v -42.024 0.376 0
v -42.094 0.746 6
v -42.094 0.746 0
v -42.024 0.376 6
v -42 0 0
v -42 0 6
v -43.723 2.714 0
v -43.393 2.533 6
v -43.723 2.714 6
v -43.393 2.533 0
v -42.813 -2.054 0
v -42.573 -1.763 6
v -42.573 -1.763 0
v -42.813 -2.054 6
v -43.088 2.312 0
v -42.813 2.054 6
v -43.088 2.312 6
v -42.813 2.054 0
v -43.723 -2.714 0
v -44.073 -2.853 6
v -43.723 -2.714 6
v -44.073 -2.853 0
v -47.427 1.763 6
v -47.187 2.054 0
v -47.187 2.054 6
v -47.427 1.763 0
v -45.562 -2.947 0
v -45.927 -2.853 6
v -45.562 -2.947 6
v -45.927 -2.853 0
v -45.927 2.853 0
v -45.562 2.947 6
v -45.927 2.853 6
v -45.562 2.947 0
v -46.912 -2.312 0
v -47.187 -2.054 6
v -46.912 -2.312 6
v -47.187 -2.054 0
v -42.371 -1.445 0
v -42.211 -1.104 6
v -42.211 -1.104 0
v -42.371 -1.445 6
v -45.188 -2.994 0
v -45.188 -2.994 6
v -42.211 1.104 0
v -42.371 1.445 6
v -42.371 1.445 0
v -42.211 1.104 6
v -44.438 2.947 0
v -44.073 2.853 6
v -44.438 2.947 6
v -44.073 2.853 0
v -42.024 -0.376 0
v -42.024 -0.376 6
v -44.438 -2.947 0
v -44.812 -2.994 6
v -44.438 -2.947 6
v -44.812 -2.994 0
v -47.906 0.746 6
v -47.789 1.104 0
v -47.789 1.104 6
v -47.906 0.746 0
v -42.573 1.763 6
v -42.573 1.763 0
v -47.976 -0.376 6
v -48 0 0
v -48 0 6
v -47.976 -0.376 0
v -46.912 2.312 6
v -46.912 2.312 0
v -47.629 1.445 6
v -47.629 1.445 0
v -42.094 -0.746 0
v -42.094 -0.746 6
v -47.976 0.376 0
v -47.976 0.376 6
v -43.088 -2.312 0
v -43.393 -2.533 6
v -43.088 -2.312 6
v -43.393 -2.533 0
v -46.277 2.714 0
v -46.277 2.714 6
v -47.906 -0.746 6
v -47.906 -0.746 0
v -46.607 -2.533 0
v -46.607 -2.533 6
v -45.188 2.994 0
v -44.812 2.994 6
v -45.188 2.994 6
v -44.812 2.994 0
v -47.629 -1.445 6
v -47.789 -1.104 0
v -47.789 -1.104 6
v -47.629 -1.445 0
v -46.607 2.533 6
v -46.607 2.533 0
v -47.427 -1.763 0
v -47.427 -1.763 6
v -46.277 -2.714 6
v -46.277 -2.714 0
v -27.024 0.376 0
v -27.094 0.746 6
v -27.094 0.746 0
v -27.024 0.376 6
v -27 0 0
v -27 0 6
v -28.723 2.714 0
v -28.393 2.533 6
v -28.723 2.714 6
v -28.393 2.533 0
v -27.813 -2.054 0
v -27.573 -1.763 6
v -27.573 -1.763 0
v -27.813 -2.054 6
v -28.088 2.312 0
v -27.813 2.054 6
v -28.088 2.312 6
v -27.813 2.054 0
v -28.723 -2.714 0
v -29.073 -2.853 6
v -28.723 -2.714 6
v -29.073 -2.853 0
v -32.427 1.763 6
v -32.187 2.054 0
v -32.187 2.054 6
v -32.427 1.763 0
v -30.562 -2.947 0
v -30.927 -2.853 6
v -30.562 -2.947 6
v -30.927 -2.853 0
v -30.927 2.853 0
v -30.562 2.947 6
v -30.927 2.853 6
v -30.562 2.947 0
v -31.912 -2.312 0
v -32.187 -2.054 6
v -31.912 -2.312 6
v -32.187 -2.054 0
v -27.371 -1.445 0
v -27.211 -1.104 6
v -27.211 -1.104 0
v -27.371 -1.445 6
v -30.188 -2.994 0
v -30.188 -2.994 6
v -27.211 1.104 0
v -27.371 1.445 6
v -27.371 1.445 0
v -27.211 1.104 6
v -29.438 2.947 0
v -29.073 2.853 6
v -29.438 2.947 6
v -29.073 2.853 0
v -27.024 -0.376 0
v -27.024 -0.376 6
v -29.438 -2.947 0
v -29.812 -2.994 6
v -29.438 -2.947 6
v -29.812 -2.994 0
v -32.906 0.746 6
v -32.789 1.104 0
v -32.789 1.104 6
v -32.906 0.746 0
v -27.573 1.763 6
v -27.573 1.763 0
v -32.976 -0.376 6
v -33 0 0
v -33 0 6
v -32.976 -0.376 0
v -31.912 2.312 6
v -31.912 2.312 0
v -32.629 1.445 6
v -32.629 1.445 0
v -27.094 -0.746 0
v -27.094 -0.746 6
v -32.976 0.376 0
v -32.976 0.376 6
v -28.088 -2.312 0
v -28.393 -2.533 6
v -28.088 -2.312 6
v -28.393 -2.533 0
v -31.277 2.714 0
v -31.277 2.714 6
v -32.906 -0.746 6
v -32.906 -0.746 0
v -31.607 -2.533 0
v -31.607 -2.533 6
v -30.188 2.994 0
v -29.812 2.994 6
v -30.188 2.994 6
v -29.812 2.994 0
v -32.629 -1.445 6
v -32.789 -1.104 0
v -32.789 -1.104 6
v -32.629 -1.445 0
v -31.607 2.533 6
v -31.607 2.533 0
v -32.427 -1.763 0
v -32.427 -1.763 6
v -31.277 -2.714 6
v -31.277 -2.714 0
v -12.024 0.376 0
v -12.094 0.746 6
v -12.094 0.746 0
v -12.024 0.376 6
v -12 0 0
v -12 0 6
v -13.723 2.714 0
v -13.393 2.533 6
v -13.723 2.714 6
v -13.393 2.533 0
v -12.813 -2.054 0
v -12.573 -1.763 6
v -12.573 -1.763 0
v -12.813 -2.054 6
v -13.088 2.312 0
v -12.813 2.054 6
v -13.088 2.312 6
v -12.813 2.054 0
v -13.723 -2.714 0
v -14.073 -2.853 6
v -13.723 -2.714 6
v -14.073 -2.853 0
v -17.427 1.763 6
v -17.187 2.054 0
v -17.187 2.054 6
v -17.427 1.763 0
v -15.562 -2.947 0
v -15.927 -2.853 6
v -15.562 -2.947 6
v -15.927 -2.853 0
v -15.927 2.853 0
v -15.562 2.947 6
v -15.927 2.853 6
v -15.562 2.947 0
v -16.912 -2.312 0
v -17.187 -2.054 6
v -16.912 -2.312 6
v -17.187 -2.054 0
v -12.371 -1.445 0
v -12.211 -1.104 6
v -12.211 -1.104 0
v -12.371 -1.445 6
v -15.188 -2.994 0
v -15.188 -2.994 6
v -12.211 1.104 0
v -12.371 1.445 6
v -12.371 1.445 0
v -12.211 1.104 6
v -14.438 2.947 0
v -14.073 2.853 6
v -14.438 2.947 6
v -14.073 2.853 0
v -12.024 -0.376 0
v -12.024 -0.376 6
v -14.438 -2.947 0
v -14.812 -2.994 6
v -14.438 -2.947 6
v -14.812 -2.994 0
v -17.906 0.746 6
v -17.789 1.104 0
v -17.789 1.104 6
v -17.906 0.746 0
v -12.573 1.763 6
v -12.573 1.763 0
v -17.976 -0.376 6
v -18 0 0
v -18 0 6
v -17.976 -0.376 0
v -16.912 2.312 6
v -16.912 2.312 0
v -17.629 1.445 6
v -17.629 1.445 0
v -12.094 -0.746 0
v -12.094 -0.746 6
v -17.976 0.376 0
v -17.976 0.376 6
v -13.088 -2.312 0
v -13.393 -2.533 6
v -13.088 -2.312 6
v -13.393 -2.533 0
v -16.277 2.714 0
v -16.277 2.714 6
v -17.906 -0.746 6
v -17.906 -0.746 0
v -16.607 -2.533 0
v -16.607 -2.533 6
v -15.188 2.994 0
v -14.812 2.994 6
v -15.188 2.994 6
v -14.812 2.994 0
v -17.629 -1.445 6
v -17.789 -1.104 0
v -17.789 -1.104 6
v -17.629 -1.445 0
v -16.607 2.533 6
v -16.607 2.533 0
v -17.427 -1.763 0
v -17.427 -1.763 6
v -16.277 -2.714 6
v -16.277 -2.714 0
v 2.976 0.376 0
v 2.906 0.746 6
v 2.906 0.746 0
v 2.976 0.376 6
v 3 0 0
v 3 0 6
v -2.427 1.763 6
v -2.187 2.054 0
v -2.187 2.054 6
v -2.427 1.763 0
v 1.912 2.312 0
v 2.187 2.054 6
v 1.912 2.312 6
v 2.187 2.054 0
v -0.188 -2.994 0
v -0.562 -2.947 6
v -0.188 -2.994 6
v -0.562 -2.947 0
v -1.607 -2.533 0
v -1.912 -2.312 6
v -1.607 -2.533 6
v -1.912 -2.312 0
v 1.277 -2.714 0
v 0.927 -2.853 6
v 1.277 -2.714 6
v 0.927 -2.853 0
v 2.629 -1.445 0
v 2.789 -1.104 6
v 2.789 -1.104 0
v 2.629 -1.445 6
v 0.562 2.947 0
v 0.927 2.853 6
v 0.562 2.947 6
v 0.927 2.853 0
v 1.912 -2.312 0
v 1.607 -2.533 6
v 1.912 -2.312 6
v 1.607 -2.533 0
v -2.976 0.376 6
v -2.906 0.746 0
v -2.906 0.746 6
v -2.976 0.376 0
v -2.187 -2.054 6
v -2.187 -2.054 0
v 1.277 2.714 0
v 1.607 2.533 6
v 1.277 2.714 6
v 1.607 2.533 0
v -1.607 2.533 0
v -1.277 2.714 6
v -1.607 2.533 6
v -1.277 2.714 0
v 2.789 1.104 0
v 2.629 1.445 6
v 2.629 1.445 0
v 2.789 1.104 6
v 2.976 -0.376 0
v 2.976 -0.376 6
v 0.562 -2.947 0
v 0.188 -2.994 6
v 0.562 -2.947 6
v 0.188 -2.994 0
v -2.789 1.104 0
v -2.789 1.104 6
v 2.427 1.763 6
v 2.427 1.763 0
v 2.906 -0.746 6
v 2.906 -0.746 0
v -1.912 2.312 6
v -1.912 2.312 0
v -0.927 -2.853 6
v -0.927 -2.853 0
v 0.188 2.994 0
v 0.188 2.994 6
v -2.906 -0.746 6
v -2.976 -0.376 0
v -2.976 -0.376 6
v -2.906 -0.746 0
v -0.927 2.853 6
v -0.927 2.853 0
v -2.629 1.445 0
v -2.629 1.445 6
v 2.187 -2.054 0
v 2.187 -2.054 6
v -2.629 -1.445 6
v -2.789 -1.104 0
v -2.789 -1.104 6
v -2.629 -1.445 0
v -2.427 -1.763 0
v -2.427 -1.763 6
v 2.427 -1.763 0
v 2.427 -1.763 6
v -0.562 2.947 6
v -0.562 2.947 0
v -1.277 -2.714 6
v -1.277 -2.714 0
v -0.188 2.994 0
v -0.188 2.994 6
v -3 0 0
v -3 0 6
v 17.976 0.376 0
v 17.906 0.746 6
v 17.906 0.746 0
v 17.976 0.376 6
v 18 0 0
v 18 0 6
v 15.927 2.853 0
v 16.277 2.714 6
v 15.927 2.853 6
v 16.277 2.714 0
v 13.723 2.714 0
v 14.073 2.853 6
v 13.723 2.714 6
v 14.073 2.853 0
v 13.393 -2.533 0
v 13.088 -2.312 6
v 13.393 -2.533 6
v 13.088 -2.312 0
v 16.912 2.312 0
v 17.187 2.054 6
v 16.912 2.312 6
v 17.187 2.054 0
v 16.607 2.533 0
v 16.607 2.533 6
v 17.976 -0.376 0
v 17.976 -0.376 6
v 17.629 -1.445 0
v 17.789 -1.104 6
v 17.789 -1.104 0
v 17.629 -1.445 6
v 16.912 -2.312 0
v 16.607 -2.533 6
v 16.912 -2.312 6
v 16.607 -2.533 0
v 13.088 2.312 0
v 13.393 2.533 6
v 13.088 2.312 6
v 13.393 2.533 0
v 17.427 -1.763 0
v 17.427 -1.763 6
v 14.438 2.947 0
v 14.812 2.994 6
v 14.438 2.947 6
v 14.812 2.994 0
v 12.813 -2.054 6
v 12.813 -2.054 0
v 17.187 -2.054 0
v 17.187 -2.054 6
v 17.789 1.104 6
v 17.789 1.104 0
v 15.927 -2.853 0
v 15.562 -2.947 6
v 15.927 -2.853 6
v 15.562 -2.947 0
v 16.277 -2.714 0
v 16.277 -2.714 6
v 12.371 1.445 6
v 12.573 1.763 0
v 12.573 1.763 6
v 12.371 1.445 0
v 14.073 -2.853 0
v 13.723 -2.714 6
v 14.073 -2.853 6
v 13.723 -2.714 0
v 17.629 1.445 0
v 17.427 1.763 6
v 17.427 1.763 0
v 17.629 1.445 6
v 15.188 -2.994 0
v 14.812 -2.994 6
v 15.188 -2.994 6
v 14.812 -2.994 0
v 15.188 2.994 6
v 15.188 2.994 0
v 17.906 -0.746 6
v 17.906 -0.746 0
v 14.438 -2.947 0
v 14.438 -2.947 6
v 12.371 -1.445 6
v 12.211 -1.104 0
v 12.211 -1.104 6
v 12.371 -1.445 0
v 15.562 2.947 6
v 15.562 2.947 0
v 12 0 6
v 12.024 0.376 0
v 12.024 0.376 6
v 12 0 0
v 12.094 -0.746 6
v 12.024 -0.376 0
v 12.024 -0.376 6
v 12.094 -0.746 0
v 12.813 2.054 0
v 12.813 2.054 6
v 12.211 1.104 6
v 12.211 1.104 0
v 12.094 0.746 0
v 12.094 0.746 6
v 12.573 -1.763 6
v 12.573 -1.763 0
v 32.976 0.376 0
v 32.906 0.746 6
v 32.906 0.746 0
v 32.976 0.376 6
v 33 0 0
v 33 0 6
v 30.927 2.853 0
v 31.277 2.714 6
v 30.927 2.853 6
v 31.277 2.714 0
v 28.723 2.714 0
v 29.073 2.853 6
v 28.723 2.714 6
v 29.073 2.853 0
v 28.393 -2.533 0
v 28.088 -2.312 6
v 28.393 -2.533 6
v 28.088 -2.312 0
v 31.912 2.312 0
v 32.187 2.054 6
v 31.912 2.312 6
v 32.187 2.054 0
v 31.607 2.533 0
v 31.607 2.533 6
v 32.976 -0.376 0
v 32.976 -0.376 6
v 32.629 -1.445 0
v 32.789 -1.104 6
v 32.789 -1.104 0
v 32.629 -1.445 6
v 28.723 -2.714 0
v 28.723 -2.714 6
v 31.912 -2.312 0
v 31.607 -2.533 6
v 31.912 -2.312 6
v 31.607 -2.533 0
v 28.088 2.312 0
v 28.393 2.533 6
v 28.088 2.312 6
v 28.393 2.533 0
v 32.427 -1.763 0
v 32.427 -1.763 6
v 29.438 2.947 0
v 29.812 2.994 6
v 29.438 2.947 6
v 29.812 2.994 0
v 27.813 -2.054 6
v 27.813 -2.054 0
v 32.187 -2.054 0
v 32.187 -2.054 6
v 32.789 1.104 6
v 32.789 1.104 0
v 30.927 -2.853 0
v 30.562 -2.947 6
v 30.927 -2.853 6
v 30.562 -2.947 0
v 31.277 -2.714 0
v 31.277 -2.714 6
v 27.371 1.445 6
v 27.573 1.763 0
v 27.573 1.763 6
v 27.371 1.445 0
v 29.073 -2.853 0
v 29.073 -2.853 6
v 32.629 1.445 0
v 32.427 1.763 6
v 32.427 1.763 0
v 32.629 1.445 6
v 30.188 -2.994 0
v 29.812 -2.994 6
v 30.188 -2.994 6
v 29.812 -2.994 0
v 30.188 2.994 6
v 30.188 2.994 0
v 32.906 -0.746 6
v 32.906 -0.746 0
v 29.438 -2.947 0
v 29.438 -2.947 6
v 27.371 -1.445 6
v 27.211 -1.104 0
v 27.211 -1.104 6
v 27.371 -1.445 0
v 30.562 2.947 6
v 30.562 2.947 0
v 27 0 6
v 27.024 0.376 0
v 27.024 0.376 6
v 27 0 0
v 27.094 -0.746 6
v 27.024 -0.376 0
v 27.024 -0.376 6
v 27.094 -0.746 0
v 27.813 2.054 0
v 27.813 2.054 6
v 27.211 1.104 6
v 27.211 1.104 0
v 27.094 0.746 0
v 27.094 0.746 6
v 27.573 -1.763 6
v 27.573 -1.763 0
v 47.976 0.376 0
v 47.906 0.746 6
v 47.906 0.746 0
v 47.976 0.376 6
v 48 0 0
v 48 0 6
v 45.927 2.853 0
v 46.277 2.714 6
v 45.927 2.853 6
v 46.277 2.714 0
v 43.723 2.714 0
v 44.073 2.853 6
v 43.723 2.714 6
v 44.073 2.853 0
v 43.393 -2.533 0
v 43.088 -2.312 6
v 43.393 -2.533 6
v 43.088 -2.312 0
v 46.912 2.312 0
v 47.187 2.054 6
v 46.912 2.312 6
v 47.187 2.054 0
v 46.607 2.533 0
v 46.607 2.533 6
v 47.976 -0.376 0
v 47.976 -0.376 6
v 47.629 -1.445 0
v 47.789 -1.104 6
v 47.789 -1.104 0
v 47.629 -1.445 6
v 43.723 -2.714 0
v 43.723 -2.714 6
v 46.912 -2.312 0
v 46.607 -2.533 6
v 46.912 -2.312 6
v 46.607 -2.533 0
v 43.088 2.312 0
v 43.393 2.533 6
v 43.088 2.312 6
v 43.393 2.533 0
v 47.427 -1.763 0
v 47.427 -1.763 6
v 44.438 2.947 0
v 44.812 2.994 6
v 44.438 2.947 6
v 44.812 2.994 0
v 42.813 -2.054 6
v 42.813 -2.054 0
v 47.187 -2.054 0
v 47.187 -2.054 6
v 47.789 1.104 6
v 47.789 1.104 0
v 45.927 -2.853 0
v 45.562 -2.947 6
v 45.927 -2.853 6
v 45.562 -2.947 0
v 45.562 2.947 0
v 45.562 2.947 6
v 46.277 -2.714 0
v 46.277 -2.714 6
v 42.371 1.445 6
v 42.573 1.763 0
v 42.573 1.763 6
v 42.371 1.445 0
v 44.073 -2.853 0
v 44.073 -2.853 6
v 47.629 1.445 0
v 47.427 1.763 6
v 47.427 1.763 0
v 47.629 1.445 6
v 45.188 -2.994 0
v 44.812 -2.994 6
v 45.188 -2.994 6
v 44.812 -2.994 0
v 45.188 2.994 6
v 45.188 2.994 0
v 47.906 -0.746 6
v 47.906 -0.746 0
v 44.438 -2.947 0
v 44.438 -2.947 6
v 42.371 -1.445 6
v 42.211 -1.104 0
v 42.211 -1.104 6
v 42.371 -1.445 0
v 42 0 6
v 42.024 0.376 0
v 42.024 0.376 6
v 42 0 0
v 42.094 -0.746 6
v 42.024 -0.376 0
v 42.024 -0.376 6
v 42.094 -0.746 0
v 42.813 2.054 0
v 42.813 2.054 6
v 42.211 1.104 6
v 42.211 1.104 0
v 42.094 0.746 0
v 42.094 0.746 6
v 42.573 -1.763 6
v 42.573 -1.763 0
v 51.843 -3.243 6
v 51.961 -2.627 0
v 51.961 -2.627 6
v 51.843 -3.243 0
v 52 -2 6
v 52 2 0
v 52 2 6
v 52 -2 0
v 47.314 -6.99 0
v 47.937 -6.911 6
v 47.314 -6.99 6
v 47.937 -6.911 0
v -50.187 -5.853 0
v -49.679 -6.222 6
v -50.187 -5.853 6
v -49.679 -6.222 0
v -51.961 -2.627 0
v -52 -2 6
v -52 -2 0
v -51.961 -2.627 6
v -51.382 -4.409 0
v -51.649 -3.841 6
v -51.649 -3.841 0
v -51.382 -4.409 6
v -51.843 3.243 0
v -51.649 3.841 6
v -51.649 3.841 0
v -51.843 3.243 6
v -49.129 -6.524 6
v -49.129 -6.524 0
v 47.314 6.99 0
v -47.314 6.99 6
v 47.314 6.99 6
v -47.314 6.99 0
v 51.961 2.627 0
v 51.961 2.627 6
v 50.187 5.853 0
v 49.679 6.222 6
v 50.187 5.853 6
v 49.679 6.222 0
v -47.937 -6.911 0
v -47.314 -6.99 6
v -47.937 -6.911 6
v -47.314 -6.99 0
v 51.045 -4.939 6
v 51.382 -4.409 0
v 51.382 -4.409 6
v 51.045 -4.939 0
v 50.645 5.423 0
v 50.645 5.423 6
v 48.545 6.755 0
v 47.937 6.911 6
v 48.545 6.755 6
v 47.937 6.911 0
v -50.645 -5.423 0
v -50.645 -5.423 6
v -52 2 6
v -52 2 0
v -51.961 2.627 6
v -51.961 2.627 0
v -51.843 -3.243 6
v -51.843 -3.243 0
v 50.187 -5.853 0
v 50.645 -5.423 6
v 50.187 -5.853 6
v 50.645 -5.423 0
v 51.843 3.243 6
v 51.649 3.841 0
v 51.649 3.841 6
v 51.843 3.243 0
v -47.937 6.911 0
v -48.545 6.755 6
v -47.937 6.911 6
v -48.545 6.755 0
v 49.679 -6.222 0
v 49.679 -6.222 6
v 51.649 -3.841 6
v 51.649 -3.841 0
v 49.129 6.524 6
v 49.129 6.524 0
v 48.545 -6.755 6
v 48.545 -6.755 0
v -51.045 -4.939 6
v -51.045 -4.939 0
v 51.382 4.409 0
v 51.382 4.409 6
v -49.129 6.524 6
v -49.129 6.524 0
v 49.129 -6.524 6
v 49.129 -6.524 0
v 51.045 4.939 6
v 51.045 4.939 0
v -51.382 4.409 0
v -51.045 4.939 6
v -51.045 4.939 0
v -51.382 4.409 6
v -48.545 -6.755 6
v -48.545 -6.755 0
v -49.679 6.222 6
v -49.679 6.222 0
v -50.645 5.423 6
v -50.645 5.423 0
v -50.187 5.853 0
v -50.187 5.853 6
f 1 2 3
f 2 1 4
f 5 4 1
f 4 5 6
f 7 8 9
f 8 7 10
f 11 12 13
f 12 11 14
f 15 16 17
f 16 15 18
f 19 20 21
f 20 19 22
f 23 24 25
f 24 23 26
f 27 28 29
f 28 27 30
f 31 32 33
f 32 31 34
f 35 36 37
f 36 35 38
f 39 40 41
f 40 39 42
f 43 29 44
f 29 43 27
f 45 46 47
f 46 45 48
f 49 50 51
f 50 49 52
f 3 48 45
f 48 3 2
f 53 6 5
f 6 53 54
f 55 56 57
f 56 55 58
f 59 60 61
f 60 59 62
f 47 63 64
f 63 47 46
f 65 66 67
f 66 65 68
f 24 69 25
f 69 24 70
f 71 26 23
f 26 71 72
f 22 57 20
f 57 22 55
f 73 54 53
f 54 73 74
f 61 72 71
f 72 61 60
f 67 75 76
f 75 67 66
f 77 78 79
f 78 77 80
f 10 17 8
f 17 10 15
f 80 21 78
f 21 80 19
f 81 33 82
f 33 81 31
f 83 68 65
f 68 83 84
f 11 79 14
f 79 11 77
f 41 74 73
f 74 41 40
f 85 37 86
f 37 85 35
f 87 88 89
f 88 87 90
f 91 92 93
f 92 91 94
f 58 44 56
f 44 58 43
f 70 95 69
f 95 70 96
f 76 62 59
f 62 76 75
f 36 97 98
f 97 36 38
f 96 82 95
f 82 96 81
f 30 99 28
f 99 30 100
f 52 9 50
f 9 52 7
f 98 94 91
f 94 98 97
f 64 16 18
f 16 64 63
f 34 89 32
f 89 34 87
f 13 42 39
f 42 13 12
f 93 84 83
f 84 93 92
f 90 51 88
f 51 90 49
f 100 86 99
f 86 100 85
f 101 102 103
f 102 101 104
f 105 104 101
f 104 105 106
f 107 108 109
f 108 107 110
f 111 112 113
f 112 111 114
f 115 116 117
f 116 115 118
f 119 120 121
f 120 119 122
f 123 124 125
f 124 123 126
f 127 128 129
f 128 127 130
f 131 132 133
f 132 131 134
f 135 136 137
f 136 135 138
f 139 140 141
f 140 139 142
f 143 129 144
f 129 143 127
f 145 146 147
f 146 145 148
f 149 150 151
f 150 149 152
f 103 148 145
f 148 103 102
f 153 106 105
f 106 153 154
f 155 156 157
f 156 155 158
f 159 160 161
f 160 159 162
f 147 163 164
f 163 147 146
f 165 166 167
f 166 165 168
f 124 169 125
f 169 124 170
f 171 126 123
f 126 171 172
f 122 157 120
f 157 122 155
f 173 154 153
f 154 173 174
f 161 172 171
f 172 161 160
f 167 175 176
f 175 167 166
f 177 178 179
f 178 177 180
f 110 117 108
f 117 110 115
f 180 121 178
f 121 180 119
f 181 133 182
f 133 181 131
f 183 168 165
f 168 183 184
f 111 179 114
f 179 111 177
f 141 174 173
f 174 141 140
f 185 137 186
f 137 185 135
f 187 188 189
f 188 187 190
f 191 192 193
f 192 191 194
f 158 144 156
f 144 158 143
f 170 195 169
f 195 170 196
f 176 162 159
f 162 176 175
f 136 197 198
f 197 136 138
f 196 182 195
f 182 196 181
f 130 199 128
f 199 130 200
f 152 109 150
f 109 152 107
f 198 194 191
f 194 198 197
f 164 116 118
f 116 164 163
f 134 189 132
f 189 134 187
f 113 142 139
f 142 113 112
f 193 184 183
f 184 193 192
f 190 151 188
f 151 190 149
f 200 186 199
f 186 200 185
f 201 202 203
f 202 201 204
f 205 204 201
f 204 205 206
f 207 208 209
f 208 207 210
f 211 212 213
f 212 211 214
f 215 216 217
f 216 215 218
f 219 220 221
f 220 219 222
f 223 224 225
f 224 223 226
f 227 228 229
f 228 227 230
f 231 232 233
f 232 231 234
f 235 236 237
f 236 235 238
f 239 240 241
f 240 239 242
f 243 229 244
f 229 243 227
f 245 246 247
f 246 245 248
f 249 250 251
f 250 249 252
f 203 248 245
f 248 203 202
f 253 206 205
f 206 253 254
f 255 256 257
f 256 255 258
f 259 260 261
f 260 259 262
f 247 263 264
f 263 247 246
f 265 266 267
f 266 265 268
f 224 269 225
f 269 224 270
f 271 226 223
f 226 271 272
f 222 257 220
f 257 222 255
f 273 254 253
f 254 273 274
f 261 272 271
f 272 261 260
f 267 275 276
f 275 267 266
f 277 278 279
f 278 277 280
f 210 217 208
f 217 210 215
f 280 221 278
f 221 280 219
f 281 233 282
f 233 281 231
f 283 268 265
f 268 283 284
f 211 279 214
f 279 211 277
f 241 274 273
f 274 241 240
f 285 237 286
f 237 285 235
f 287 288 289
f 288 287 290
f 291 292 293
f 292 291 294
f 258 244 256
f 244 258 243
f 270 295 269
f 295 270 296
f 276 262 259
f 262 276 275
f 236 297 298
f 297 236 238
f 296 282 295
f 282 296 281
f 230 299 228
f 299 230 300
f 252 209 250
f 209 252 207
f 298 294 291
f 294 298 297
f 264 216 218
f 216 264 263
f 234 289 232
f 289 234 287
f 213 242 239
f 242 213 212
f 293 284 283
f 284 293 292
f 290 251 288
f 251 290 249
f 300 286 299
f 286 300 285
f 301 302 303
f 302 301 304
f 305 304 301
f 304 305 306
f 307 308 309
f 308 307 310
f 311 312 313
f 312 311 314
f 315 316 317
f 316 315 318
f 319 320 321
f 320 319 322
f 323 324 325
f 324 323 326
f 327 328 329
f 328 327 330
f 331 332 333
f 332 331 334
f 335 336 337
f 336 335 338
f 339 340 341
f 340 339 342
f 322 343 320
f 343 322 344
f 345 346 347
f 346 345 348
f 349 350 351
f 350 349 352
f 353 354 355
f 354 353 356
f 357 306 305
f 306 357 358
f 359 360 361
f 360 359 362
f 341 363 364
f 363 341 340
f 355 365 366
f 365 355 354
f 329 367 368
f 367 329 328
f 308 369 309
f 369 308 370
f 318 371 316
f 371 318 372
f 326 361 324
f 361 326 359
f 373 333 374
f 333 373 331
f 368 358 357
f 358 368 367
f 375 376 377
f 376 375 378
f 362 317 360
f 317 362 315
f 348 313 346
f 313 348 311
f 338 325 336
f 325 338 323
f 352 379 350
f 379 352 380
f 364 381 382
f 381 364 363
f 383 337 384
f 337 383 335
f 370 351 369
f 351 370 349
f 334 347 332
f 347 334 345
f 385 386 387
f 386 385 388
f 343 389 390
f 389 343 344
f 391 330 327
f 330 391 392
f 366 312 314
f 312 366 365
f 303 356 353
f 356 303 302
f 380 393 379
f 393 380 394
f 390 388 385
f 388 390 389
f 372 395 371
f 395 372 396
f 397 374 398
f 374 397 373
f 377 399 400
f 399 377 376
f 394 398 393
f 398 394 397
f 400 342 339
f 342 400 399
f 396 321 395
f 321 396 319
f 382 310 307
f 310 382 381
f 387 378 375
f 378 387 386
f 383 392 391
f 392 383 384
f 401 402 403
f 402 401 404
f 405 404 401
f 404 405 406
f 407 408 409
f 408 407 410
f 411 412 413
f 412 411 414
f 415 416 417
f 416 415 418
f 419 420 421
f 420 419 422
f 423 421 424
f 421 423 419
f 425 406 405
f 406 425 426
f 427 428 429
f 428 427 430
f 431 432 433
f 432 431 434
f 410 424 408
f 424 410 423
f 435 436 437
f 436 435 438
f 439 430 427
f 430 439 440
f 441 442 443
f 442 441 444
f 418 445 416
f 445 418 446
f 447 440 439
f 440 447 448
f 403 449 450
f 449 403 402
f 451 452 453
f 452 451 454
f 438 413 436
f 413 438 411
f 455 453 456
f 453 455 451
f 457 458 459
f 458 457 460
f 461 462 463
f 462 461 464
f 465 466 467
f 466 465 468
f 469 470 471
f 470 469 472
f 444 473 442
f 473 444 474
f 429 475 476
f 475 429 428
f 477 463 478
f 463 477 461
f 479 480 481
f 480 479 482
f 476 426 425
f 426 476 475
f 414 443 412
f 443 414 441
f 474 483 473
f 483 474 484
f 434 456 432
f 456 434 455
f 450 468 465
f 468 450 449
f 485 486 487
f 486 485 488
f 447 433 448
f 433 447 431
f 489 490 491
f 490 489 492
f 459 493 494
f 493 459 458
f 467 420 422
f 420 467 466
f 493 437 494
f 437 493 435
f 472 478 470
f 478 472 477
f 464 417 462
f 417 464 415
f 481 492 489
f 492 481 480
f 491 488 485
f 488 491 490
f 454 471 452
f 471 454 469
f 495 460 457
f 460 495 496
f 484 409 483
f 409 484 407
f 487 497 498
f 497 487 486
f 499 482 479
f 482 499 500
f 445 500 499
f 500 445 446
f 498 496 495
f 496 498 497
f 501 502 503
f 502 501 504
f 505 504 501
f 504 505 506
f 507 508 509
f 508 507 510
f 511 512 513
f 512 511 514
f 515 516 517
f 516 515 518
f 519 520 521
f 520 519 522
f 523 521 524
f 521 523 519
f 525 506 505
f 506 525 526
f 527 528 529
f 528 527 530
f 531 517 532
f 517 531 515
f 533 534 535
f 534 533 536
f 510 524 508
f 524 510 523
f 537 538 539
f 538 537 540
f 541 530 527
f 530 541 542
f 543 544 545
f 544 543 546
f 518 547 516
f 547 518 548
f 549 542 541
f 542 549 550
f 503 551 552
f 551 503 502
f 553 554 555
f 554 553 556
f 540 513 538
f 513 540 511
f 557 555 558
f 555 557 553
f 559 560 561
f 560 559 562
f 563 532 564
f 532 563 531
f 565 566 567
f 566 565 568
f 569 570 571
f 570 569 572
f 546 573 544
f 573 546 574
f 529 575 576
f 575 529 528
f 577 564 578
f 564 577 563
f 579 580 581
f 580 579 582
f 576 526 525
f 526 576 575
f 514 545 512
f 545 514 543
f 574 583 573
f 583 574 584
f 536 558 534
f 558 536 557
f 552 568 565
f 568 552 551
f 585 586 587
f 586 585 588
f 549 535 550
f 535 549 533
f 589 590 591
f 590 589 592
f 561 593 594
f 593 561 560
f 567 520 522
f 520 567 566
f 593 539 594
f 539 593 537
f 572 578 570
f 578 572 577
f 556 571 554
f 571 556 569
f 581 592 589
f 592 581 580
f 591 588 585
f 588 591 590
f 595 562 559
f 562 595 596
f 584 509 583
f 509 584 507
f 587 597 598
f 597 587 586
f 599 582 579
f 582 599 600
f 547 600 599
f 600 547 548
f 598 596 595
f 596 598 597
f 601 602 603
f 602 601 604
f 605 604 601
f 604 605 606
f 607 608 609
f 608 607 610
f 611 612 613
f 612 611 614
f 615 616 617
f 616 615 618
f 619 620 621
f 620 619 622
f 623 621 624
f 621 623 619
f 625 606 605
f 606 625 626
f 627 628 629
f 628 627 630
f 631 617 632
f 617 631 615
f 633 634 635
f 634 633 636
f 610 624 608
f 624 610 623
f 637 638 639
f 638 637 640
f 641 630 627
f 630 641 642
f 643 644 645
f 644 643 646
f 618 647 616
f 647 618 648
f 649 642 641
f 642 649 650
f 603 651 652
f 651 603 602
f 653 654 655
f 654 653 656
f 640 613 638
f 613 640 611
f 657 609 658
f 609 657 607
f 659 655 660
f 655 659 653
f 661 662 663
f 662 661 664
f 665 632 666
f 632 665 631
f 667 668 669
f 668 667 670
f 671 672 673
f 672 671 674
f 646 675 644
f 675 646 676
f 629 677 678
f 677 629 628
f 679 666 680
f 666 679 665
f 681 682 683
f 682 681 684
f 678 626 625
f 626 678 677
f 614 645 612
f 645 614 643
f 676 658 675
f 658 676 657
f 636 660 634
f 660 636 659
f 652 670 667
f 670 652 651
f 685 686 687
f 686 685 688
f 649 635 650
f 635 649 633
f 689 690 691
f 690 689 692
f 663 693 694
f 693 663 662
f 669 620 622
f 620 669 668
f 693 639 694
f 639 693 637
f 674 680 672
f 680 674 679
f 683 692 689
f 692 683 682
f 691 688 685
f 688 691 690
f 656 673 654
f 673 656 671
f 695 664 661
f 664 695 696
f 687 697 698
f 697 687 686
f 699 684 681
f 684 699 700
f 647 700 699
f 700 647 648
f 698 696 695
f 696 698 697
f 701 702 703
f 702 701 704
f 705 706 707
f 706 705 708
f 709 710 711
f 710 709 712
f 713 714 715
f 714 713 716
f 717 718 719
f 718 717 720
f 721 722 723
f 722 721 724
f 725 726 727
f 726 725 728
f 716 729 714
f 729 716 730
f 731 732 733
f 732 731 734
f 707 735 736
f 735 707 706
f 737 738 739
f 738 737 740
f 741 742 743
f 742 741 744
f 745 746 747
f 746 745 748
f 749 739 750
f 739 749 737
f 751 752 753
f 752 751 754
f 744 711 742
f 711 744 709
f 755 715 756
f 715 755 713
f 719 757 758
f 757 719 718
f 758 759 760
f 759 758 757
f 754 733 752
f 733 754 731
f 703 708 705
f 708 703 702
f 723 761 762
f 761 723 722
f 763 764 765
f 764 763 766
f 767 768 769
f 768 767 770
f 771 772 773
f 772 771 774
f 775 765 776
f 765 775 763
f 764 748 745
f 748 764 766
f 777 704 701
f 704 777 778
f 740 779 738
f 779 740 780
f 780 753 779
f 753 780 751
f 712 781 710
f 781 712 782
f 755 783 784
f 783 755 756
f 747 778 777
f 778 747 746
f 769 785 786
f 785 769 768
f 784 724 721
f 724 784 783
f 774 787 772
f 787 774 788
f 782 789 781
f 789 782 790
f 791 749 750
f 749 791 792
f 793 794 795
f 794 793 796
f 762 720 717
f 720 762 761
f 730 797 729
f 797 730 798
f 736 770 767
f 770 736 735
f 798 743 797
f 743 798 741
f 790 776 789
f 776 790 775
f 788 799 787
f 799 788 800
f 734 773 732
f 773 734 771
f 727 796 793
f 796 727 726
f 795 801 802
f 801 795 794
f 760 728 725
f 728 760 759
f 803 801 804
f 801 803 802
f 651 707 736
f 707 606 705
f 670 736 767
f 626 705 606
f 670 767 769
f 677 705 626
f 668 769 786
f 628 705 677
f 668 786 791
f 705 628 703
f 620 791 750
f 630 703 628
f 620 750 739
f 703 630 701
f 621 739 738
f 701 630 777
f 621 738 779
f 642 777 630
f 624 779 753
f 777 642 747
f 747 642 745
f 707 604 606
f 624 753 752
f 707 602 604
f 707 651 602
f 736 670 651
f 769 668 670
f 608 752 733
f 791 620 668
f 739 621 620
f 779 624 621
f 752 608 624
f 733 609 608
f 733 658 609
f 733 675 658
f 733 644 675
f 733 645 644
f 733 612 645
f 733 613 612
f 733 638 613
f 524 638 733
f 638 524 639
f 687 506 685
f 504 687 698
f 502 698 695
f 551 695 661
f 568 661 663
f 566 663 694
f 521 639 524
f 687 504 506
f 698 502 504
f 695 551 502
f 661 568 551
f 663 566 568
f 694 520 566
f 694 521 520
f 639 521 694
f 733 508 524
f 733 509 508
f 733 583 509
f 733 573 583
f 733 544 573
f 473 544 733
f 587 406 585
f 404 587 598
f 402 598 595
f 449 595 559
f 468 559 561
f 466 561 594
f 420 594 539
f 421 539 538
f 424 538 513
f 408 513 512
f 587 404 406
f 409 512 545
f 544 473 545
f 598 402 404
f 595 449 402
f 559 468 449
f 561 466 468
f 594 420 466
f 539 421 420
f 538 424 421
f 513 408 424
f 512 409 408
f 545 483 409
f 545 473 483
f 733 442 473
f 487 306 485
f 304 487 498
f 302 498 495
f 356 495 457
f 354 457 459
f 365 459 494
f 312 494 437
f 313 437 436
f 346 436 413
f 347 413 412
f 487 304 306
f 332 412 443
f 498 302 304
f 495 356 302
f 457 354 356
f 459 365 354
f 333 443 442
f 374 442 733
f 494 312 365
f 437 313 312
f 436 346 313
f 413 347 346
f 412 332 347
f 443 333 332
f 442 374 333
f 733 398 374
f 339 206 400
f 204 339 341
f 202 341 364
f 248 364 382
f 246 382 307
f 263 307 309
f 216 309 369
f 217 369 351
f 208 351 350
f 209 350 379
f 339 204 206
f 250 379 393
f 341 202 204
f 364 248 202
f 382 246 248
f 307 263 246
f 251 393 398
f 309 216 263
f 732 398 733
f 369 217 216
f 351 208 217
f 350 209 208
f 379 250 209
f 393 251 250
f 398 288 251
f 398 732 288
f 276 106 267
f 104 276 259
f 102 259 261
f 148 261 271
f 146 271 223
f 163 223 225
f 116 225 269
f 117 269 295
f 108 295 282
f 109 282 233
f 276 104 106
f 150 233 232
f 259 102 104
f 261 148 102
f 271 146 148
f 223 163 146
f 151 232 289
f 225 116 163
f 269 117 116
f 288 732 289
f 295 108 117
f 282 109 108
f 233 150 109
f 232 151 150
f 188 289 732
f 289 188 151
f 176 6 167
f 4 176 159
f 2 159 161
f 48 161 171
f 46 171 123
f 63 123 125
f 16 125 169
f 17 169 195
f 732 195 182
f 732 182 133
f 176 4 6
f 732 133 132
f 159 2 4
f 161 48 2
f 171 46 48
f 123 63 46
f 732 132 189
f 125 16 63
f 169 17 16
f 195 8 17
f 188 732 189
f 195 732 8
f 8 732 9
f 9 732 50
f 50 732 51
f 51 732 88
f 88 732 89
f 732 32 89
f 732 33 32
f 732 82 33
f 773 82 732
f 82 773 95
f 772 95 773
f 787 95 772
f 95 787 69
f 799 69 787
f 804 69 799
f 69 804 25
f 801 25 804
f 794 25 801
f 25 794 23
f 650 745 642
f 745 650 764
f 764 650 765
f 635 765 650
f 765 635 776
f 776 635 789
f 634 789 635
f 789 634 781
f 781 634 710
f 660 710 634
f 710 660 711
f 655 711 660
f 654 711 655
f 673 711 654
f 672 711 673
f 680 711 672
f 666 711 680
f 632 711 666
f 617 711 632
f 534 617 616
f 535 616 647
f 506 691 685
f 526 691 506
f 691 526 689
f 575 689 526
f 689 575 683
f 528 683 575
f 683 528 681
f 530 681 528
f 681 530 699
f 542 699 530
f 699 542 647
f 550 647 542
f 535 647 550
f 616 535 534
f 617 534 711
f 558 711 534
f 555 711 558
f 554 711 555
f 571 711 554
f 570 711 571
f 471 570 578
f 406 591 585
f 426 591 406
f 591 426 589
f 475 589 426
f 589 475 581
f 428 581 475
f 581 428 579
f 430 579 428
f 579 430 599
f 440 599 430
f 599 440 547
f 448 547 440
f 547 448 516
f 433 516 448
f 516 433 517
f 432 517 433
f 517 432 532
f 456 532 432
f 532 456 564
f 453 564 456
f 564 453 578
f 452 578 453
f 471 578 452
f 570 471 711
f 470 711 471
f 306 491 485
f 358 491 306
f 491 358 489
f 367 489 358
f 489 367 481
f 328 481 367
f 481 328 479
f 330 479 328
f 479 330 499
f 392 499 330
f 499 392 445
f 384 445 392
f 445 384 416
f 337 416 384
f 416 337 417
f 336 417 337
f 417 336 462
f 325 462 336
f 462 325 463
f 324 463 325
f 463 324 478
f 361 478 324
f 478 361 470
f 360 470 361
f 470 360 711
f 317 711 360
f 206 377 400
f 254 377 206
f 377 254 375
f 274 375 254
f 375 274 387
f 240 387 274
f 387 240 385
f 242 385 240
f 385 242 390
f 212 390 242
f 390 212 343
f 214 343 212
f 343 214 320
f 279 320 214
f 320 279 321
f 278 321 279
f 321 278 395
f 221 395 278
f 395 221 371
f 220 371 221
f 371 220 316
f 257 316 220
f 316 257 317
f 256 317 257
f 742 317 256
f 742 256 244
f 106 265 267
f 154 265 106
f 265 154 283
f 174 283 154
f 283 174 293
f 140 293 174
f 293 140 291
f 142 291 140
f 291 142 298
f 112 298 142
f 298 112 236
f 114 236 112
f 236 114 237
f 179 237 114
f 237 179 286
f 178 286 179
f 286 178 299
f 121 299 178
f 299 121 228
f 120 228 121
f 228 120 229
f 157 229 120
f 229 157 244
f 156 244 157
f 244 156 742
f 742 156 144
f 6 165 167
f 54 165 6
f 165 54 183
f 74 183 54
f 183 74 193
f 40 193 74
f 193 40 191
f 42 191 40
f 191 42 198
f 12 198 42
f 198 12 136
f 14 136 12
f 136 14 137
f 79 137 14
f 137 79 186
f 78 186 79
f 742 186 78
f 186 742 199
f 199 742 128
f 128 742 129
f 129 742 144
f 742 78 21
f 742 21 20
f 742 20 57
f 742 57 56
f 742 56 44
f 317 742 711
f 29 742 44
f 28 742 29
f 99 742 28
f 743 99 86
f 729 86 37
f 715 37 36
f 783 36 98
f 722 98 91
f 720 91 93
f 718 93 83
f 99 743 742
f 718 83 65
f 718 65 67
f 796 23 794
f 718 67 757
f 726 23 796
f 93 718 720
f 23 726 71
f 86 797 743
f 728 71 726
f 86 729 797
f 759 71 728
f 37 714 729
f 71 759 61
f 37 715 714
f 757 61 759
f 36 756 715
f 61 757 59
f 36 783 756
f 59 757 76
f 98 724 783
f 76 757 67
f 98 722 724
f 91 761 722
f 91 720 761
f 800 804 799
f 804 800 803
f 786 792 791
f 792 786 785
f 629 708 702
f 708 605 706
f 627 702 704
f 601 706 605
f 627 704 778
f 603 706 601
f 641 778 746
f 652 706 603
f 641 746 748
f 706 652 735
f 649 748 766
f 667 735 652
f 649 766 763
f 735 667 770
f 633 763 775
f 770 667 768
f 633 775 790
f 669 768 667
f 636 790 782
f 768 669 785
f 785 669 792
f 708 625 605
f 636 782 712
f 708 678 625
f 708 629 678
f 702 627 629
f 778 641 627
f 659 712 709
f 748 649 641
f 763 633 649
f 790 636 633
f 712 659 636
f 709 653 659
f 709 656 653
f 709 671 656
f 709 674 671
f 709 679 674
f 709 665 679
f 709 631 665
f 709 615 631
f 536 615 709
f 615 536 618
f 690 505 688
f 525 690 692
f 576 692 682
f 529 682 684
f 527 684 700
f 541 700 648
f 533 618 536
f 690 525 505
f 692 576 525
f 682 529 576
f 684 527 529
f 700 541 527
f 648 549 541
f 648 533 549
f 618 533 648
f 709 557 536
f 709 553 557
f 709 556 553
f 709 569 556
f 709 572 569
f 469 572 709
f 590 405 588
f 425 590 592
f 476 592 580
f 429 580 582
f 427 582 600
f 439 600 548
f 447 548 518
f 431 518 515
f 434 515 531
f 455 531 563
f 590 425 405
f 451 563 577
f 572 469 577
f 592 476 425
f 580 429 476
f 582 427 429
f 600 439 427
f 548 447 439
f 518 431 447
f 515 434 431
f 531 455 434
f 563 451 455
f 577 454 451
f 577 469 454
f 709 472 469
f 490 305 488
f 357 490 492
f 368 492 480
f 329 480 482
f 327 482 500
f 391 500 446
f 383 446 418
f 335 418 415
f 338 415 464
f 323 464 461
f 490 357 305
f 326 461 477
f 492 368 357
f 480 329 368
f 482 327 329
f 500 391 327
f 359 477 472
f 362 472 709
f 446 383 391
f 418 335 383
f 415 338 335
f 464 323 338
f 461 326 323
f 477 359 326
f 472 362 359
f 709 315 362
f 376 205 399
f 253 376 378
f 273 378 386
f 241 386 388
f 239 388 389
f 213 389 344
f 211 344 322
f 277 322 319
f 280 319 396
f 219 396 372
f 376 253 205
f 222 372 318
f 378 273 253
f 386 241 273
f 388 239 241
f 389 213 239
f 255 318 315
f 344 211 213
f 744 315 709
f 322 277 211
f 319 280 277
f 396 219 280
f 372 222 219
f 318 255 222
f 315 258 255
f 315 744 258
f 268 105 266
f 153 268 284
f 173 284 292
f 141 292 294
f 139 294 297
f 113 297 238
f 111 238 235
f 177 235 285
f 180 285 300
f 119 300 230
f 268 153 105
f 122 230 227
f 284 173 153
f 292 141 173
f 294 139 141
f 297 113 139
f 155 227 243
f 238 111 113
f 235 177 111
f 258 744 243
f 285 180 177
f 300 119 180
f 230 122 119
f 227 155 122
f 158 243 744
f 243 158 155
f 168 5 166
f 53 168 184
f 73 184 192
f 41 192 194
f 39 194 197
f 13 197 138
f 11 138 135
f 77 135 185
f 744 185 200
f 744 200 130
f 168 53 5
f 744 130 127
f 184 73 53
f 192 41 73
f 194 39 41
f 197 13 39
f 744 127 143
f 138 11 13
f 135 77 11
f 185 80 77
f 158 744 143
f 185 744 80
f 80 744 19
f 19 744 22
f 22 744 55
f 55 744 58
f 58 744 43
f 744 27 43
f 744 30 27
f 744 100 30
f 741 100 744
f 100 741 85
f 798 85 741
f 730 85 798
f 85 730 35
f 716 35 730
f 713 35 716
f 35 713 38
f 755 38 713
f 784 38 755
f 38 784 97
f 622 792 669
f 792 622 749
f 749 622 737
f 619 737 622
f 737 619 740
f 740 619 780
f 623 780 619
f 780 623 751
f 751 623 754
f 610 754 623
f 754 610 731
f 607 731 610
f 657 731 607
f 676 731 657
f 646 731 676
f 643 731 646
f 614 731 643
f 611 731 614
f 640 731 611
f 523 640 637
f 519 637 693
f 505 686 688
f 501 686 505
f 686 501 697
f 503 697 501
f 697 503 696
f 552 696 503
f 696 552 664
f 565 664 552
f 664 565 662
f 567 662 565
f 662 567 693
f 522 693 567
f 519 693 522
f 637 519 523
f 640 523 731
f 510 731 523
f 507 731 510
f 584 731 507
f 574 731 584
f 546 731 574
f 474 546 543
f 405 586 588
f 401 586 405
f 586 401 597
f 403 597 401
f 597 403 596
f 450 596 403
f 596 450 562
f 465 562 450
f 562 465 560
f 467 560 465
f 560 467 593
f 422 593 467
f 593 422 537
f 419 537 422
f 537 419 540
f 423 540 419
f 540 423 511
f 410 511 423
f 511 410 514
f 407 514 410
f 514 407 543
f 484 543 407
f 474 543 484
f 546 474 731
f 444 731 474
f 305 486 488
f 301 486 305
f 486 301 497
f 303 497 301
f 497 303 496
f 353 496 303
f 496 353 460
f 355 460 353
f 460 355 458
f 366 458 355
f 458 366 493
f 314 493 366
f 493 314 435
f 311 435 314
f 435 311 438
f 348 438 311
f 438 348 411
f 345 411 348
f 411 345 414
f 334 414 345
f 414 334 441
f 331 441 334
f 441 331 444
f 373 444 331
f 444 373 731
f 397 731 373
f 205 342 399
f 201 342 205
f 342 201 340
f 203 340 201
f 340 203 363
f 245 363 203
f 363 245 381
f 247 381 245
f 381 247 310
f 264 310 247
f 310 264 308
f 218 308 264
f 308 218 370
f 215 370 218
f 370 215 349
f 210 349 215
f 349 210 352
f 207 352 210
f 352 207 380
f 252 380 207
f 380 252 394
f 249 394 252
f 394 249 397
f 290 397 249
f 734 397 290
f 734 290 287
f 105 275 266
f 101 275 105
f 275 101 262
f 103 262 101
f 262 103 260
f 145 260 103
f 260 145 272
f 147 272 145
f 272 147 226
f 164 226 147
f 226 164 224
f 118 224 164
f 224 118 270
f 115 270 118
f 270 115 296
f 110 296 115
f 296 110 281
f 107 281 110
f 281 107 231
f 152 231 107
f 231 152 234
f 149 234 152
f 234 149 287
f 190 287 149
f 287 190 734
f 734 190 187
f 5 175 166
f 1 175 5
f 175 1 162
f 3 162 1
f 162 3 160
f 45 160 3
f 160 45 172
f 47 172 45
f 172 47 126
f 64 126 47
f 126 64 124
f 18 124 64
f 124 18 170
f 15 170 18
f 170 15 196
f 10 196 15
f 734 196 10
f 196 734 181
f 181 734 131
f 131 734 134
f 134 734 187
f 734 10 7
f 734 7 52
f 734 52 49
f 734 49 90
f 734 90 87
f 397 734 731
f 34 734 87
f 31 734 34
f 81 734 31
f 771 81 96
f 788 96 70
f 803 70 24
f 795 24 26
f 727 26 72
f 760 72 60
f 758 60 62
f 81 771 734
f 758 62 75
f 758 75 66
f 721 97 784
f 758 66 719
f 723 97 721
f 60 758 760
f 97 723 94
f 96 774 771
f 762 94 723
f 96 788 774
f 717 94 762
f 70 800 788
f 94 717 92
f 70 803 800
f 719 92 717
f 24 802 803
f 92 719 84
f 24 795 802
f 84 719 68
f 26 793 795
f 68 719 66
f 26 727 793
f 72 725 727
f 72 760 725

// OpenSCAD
$fn = 50;


difference() {
	union() {
		hull() {
			translate(v = [-47.0000000000, 2.0000000000, 0]) {
				cylinder(h = 6, r = 5);
			}
			translate(v = [47.0000000000, 2.0000000000, 0]) {
				cylinder(h = 6, r = 5);
			}
			translate(v = [-47.0000000000, -2.0000000000, 0]) {
				cylinder(h = 6, r = 5);
			}
			translate(v = [47.0000000000, -2.0000000000, 0]) {
				cylinder(h = 6, r = 5);
			}
		}
	}
	union() {
		translate(v = [-45.0000000000, 0.0000000000, 0]) {
			translate(v = [0, 0, -100]) {
				cylinder(h = 200, r = 3.0000000000);
			}
		}
		translate(v = [-30.0000000000, 0.0000000000, 0]) {
			translate(v = [0, 0, -100]) {
				cylinder(h = 200, r = 3.0000000000);
			}
		}
		translate(v = [-15.0000000000, 0.0000000000, 0]) {
			translate(v = [0, 0, -100]) {
				cylinder(h = 200, r = 3.0000000000);
			}
		}
		translate(v = [0, 0, -100]) {
			cylinder(h = 200, r = 3.0000000000);
		}
		translate(v = [15.0000000000, 0.0000000000, 0]) {
			translate(v = [0, 0, -100]) {
				cylinder(h = 200, r = 3.0000000000);
			}
		}
		translate(v = [30.0000000000, 0.0000000000, 0]) {
			translate(v = [0, 0, -100]) {
				cylinder(h = 200, r = 3.0000000000);
			}
		}
		translate(v = [45.0000000000, 0.0000000000, 0]) {
			translate(v = [0, 0, -100]) {
				cylinder(h = 200, r = 3.0000000000);
			}
		}
	}
}
